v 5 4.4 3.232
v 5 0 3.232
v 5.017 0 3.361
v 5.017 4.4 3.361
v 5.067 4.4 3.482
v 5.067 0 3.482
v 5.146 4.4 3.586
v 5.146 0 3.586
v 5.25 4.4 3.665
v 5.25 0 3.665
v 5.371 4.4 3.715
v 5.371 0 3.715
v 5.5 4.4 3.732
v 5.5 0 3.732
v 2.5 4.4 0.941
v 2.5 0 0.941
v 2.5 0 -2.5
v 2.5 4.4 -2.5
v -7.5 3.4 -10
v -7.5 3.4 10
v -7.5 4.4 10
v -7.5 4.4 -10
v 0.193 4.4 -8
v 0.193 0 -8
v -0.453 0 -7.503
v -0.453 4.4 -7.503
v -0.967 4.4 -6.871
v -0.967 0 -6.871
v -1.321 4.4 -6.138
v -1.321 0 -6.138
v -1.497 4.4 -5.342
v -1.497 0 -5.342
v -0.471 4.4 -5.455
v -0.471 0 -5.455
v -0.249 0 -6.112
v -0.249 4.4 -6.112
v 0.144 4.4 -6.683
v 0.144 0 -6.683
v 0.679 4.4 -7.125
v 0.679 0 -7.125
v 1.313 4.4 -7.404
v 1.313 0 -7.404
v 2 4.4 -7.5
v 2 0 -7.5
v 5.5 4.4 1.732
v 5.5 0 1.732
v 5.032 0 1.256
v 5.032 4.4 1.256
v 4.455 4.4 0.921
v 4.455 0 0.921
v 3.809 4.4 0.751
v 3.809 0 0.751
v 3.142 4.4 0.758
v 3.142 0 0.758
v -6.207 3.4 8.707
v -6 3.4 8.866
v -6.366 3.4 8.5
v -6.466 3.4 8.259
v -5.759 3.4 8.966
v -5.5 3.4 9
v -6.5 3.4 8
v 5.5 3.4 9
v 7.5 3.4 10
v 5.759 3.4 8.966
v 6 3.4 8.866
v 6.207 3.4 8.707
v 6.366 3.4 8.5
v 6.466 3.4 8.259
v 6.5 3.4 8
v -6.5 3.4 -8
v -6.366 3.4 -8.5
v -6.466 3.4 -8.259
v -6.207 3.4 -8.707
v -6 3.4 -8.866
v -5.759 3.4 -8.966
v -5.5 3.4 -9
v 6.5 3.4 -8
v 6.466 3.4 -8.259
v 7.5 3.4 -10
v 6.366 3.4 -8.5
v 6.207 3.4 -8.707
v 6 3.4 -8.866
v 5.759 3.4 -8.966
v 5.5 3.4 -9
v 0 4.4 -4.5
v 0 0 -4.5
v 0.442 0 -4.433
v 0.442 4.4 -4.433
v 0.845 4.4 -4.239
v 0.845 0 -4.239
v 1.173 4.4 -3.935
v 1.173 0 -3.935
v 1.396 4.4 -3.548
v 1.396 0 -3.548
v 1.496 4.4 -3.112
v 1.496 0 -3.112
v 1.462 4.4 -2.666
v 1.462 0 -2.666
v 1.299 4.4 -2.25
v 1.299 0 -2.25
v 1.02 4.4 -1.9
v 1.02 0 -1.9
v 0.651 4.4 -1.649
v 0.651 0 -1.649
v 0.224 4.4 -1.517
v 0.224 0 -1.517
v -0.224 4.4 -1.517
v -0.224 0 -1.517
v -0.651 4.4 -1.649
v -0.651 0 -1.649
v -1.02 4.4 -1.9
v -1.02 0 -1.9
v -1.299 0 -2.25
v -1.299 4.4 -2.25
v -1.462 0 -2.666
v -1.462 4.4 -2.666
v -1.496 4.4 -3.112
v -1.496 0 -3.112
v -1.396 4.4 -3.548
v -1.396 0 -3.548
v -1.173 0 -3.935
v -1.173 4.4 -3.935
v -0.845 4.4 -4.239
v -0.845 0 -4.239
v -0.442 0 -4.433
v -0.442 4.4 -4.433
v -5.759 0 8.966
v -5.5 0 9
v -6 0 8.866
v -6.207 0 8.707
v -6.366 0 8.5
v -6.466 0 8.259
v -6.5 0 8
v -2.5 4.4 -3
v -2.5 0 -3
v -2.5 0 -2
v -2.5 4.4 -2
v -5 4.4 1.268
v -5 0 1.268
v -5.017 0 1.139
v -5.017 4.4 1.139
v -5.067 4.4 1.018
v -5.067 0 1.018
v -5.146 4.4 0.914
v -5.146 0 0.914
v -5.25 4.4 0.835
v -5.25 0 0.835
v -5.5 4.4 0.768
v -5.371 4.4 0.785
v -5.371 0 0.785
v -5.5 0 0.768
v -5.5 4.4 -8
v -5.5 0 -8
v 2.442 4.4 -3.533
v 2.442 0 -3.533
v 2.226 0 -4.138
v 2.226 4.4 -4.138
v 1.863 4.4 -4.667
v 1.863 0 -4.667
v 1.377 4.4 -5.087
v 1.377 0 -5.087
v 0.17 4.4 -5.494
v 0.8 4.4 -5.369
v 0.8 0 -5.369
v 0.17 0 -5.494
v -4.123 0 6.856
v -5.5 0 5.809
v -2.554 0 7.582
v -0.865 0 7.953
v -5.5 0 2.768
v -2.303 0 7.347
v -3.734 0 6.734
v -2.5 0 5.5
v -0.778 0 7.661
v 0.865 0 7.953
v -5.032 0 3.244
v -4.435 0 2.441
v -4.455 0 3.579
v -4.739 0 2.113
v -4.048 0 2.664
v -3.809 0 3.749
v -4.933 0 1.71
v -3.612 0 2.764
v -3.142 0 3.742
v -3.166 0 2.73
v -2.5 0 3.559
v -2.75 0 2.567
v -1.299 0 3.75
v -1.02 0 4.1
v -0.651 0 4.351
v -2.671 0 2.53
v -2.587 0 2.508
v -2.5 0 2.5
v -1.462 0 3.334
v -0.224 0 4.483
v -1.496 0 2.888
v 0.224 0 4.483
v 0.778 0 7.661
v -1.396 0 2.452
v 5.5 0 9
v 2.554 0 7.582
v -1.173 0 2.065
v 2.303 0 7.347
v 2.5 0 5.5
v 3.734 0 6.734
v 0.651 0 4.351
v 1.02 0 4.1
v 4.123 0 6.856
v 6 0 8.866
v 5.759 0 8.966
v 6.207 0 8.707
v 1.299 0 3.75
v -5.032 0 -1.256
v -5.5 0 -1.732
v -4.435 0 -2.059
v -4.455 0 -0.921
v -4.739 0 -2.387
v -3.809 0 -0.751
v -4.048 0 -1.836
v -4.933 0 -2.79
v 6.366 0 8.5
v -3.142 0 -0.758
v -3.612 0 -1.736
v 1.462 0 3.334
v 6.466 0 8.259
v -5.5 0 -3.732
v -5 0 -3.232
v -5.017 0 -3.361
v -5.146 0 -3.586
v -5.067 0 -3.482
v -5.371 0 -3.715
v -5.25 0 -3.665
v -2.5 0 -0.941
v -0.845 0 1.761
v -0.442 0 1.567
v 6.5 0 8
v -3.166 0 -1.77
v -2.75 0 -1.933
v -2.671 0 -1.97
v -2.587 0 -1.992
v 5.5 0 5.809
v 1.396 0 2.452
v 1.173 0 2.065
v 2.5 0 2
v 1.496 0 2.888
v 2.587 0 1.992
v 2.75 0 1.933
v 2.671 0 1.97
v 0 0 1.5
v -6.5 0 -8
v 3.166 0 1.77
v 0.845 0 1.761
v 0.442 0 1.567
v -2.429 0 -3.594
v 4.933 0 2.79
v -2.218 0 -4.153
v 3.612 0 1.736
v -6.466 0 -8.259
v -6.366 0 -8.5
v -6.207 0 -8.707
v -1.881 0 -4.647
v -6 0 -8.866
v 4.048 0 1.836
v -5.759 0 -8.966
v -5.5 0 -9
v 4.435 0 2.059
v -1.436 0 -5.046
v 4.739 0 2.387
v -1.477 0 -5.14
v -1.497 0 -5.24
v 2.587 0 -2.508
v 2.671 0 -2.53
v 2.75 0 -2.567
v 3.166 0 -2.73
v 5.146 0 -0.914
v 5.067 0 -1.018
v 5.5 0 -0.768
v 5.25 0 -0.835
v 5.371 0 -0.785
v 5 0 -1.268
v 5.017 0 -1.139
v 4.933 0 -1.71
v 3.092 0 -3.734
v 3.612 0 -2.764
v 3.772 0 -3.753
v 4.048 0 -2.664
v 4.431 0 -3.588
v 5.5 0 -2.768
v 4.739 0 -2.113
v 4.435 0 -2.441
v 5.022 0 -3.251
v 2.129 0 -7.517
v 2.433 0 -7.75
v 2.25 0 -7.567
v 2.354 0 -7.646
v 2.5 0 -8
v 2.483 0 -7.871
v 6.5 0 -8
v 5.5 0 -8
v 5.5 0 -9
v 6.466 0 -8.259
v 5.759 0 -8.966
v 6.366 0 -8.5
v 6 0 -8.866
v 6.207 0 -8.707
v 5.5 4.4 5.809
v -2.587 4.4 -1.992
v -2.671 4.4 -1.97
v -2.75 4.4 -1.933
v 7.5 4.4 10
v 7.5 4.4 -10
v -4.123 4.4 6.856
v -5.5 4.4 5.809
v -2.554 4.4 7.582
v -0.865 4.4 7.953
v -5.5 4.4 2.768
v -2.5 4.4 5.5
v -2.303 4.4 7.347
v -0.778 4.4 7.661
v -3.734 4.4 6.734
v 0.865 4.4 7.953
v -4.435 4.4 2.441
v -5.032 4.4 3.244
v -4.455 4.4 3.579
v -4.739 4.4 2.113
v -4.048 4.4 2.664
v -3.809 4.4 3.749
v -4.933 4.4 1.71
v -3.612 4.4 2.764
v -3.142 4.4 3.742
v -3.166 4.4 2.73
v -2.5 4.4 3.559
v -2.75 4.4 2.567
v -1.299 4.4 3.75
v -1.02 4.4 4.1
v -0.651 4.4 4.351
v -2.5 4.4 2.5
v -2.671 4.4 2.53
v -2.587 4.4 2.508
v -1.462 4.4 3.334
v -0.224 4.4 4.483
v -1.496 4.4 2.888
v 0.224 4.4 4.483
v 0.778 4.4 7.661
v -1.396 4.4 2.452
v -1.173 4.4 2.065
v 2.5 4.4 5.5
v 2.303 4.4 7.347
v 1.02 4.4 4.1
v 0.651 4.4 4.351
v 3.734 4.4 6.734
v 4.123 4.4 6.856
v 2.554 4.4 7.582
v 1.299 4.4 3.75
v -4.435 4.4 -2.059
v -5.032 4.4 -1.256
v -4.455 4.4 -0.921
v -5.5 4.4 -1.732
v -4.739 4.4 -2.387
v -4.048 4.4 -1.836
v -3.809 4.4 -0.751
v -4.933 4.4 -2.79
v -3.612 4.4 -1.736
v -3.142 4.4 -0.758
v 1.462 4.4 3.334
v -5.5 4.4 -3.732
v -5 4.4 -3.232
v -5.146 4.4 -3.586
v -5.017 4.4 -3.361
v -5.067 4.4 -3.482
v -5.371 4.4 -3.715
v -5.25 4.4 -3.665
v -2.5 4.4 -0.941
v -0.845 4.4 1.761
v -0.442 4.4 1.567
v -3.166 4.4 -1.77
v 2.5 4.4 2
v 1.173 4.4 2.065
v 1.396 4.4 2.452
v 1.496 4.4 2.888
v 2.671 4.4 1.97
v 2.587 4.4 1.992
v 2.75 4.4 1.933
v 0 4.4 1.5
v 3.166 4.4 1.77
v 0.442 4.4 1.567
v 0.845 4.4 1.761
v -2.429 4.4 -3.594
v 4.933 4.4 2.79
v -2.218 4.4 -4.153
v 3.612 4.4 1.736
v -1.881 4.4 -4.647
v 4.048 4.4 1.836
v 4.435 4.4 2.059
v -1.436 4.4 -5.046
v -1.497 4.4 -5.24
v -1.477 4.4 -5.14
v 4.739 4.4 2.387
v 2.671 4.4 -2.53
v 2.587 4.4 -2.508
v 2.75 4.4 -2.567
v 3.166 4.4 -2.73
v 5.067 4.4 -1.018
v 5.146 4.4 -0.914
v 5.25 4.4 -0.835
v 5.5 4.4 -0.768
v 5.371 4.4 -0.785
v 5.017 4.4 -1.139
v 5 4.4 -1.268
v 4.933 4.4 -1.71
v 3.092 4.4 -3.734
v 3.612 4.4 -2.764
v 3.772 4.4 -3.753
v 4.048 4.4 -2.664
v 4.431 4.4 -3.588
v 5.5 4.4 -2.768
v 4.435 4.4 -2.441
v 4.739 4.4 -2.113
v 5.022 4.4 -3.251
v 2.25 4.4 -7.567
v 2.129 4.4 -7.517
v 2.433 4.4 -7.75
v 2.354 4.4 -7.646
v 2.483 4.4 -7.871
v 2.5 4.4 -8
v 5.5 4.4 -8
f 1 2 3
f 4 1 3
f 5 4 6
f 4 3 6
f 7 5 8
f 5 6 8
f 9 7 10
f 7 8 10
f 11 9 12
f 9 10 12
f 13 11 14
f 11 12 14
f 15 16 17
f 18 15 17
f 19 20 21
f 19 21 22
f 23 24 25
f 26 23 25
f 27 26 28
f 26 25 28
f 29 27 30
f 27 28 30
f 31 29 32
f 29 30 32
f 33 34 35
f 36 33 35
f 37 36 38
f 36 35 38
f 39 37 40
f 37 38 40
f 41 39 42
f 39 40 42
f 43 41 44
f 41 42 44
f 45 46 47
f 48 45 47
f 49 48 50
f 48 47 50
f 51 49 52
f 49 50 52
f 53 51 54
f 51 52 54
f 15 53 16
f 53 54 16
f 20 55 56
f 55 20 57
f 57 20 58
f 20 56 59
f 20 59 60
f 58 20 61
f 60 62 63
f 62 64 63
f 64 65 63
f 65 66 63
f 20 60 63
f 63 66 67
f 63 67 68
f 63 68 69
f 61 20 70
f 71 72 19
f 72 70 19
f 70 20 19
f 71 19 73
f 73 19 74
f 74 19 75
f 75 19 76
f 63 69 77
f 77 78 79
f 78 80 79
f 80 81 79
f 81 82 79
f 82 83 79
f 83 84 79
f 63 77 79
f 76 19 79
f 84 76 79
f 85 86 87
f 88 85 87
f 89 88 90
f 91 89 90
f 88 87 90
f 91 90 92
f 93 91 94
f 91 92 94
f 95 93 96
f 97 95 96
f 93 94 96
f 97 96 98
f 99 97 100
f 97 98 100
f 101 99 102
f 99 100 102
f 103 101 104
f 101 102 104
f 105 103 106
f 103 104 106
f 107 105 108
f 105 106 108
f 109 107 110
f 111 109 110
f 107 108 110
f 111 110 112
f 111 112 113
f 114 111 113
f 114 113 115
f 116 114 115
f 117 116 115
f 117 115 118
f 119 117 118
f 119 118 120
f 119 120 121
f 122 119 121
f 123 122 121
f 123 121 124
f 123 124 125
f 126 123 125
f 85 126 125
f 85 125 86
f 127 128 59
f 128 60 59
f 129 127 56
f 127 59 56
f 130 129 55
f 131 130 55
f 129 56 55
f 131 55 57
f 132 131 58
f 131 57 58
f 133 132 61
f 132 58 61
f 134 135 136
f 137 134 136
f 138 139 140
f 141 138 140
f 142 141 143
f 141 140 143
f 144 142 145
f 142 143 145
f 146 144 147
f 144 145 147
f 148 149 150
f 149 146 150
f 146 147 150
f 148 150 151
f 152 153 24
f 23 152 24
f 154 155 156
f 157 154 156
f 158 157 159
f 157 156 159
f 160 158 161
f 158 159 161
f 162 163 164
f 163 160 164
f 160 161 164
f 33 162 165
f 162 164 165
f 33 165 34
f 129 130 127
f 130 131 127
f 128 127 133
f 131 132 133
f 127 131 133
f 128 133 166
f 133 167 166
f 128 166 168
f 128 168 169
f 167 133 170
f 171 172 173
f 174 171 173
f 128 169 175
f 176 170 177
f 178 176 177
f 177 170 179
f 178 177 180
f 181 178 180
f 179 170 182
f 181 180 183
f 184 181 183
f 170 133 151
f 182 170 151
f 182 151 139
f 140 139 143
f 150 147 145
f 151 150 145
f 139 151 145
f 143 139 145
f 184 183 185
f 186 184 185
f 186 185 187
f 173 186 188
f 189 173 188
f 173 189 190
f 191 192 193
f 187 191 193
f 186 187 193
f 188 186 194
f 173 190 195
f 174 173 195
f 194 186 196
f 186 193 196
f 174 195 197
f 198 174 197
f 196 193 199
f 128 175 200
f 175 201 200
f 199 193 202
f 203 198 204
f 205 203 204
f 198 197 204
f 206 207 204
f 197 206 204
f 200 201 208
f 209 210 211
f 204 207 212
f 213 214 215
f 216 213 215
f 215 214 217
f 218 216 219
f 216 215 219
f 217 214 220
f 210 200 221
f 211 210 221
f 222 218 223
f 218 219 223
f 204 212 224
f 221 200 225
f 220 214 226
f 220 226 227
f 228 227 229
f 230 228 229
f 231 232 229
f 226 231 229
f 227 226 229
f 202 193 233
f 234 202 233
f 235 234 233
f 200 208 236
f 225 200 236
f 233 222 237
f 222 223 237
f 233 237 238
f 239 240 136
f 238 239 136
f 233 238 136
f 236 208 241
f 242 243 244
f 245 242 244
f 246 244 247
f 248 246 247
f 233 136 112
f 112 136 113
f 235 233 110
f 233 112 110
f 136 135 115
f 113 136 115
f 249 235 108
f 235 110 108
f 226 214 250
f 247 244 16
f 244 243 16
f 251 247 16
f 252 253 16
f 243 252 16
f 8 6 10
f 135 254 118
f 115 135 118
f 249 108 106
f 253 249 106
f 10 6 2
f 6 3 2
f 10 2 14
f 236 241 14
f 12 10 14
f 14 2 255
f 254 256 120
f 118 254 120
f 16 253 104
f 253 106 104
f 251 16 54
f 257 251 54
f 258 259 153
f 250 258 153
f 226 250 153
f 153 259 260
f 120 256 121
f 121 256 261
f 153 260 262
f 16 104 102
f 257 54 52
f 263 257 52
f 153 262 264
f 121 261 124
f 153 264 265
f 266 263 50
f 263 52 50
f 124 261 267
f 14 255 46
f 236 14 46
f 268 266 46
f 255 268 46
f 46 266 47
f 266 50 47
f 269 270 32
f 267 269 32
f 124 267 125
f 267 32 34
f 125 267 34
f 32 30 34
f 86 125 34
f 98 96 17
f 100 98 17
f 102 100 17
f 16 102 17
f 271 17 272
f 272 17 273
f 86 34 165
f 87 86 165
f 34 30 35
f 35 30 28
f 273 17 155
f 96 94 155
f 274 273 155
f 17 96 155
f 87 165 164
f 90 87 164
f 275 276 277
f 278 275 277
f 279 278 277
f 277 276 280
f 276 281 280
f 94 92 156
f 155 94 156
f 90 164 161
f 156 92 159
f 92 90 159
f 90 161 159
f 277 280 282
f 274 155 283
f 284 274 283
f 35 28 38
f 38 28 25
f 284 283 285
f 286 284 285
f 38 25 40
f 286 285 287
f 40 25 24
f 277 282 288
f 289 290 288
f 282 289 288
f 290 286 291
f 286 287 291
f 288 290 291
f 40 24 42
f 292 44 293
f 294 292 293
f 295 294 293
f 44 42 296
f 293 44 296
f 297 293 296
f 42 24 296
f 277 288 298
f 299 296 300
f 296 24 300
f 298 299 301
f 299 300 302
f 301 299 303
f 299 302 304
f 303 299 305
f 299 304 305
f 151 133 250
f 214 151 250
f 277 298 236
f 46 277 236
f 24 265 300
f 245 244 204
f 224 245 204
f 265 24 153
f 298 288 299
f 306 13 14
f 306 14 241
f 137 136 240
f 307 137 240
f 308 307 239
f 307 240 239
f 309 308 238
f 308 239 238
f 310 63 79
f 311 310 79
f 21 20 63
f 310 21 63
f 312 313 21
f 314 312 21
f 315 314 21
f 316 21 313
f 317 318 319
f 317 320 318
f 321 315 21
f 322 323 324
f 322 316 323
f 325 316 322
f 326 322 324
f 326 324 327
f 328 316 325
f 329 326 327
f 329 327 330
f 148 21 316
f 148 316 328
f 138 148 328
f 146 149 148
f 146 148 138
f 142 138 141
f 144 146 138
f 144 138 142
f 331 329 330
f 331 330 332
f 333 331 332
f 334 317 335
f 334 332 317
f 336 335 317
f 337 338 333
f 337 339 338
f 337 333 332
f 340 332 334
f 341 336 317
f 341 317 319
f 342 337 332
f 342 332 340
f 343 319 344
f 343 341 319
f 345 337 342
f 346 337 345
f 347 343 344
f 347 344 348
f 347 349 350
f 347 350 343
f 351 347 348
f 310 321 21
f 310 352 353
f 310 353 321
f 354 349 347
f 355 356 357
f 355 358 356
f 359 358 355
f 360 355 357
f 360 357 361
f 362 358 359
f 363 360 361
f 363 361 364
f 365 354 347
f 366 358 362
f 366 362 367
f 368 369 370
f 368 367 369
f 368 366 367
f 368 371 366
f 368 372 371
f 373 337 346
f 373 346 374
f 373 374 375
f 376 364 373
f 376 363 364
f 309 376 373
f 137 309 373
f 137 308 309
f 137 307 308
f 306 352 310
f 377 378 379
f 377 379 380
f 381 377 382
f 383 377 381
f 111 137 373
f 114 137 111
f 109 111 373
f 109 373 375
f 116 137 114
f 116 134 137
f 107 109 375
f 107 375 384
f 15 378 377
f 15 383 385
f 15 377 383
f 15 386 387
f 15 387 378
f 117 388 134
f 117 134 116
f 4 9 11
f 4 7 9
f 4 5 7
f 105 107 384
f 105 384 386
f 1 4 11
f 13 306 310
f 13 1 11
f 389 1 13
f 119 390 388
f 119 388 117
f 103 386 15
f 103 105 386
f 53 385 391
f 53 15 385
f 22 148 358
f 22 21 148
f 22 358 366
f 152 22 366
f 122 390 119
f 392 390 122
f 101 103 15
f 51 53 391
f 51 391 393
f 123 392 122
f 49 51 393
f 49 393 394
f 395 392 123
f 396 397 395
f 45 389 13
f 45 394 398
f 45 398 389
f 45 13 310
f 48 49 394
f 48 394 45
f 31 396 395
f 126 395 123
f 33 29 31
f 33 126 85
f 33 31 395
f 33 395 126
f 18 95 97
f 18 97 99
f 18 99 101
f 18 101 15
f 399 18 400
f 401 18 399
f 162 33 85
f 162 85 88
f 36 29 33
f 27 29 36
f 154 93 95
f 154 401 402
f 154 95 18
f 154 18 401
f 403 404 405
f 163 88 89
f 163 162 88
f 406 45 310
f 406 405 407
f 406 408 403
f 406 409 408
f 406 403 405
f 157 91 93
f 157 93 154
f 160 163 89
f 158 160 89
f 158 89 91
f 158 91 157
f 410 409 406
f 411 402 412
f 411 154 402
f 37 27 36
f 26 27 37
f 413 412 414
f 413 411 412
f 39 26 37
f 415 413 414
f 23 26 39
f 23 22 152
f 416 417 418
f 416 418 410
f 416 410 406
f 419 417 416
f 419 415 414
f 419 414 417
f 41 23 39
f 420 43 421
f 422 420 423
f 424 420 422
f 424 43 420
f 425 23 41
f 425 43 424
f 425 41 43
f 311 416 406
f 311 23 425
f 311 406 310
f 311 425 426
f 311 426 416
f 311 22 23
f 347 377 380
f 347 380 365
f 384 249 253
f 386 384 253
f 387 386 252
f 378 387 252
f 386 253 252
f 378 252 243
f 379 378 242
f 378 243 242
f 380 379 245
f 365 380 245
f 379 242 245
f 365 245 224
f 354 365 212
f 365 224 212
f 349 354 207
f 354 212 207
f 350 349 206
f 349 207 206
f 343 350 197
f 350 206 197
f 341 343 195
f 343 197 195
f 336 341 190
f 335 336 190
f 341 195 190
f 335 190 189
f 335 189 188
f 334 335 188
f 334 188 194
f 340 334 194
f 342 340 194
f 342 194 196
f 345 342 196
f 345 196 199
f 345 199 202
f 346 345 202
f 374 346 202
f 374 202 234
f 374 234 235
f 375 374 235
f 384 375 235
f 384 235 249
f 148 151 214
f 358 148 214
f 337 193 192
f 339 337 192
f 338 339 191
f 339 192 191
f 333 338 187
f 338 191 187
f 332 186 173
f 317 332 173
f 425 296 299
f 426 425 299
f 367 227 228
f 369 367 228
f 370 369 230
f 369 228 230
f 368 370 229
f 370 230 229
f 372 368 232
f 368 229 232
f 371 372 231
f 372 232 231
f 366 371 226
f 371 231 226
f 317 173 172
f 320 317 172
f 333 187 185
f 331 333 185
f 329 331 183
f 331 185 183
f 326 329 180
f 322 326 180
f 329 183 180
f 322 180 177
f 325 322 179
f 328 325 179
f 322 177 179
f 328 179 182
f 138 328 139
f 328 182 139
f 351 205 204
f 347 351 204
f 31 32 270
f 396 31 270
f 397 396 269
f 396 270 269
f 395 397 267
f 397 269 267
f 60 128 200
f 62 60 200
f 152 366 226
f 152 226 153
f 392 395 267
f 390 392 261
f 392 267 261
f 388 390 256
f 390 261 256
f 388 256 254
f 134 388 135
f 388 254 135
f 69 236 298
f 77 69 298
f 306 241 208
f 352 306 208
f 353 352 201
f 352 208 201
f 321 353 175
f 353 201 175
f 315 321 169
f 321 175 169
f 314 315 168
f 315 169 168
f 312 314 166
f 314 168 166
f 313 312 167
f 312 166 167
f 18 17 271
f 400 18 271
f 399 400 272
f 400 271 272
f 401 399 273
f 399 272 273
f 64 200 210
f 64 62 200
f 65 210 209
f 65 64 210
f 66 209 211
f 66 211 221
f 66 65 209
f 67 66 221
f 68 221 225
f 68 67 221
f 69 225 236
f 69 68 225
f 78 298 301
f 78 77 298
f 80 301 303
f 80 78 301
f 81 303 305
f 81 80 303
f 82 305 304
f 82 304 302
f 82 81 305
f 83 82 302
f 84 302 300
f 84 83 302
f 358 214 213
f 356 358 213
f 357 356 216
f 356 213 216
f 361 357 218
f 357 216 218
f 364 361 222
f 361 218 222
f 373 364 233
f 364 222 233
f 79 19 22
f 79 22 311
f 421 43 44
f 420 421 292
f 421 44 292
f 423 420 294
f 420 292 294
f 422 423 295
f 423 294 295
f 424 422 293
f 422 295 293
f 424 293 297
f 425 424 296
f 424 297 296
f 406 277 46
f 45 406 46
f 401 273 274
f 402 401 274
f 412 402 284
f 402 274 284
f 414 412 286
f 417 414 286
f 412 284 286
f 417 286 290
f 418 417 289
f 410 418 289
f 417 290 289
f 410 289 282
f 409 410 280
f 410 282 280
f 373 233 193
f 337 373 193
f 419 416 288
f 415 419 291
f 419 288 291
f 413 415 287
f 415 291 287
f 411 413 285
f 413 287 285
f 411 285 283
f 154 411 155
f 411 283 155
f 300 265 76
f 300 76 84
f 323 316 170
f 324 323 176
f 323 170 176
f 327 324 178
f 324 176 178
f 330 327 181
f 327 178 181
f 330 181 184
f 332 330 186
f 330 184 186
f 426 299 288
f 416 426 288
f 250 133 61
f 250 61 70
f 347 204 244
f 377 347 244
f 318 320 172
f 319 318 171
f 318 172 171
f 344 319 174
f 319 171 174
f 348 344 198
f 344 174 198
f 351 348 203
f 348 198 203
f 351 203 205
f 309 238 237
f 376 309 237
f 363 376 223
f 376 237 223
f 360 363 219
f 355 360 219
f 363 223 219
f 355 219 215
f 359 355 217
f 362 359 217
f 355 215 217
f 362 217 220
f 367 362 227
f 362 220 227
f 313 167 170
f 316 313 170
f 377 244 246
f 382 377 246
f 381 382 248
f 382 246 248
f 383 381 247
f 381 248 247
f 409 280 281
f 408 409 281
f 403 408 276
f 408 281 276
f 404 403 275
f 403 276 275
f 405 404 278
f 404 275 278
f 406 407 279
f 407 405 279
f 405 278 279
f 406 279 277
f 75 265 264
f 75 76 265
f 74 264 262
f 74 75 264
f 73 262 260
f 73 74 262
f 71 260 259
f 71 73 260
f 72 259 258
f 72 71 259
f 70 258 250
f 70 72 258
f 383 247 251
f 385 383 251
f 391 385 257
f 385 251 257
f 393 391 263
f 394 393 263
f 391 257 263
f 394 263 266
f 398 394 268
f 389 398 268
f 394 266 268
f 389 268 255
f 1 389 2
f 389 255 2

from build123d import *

# Parameters (mm, degrees)
SKETCH1_W           = 13
SKETCH1_H           = 18
BOSS_EXTRUDE1_DEPTH = 3.4
SKETCH2_W           = 15
SKETCH2_H           = 20
BOSS_EXTRUDE2_DEPTH = 1
SKETCH4_R           = 1.5
CUT_EXTRUDE2_DEPTH  = 14.251792332
FILLET1_R           = 1


with BuildPart() as part:
    # Sketch1 → Boss-Extrude1 (new body)
    with BuildSketch(Plane(origin=(0, 0, 0), x_dir=(1, 0, 0), z_dir=(0, 1, 0))):
        Rectangle(SKETCH1_W, SKETCH1_H)
    extrude(amount=BOSS_EXTRUDE1_DEPTH)

    # Sketch2 → Boss-Extrude2 (add)
    with BuildSketch(Plane(origin=(0, 3.4, 0), x_dir=(1, 0, 0), z_dir=(0, 1, 0))):
        Rectangle(SKETCH2_W, SKETCH2_H)
    extrude(amount=BOSS_EXTRUDE2_DEPTH)

    # Sketch4 → Cut-Extrude2 (cut, through all)
    with BuildSketch(Plane.XZ):
        with BuildLine():
            Line((-2.5, 5.5), (-3.734023309, 6.734023309))
            ThreePointArc((-3.734023309, 6.734023309), (0, 7.7), (3.734023309, 6.734023309))
            Line((3.734023309, 6.734023309), (2.5, 5.5))
            Line((2.5, 5.5), (2.5, 2))
            ThreePointArc((2.5, 2), (2.629409523, 1.982962913), (2.75, 1.933012702))
            ThreePointArc((2.75, 1.933012702), (4.25, 1.933012702), (5, 3.232050808))
            ThreePointArc((5, 3.232050808), (5.146446609, 3.585604198), (5.5, 3.732050808))
            Line((5.5, 3.732050808), (5.5, 5.809475019))
            ThreePointArc((5.5, 5.809475019), (0, 8), (-5.5, 5.809475019))
            Line((-5.5, 5.809475019), (-5.5, 2.767949192))
            ThreePointArc((-5.5, 2.767949192), (-4.137600278, 3.685275378), (-2.5, 3.55923704))
            Line((-2.5, 3.55923704), (-2.5, 5.5))
        make_face()
        with Locations(Location((0, 3, 0), (0, 0, 270))):
            Circle(SKETCH4_R)
        with BuildLine():
            Line((-2.5, -0.94076296), (-2.5, 2.5))
            ThreePointArc((-2.5, 2.5), (-2.629409523, 2.517037087), (-2.75, 2.566987298))
            ThreePointArc((-2.75, 2.566987298), (-4.25, 2.566987298), (-5, 1.267949192))
            ThreePointArc((-5, 1.267949192), (-5.146446609, 0.914395802), (-5.5, 0.767949192))
            Line((-5.5, 0.767949192), (-5.5, -1.732050808))
            ThreePointArc((-5.5, -1.732050808), (-4.137600278, -0.814724622), (-2.5, -0.94076296))
        make_face()
        with BuildLine():
            ThreePointArc((5.5, 1.732050808), (4.137600278, 0.814724622), (2.5, 0.94076296))
            Line((2.5, 0.94076296), (2.5, -2.5))
            ThreePointArc((2.5, -2.5), (2.629409523, -2.517037087), (2.75, -2.566987298))
            ThreePointArc((2.75, -2.566987298), (4.25, -2.566987298), (5, -1.267949192))
            ThreePointArc((5, -1.267949192), (5.146446609, -0.914395802), (5.5, -0.767949192))
            Line((5.5, -0.767949192), (5.5, 1.732050808))
        make_face()
        with Locations(Location((0, -3, 0), (0, 0, 270))):
            Circle(SKETCH4_R)
        with BuildLine():
            Line((-2.5, -3), (-2.5, -2))
            ThreePointArc((-2.5, -2), (-2.629409523, -1.982962913), (-2.75, -1.933012702))
            ThreePointArc((-2.75, -1.933012702), (-4.25, -1.933012702), (-5, -3.232050808))
            ThreePointArc((-5, -3.232050808), (-5.146446609, -3.585604198), (-5.5, -3.732050808))
            Line((-5.5, -3.732050808), (-5.5, -8))
            Line((-5.5, -8), (0.192885679, -8))
            ThreePointArc((0.192885679, -8), (-0.966559904, -6.870975799), (-1.497403196, -5.342180487))
            ThreePointArc((-1.497403196, -5.342180487), (-1.489544615, -5.189572213), (-1.435960525, -5.046464603))
            ThreePointArc((-1.435960525, -5.046464603), (-2.218096178, -4.153277653), (-2.5, -3))
        make_face()
        with BuildLine():
            ThreePointArc((5.5, -2.767949192), (4.107029075, -3.693132835), (2.442465304, -3.533257199))
            ThreePointArc((2.442465304, -3.533257199), (1.376562779, -5.086881625), (-0.471204729, -5.455191663))
            ThreePointArc((-0.471204729, -5.455191663), (0.396247062, -6.922515496), (2, -7.5))
            ThreePointArc((2, -7.5), (2.353553391, -7.646446609), (2.5, -8))
            Line((2.5, -8), (5.5, -8))
            Line((5.5, -8), (5.5, -2.767949192))
        make_face()
    extrude(amount=-CUT_EXTRUDE2_DEPTH, mode=Mode.SUBTRACT)

    # Fillet1
    fillet1_edges = [part.edges().sort_by_distance(p)[0] for p in [
        (6.5, 1.7, 9),
        (-6.5, 1.7, 9),
        (-6.5, 1.7, -9),
        (6.5, 1.7, -9),
    ]]
    fillet(fillet1_edges, radius=FILLET1_R)


solid = part.part
